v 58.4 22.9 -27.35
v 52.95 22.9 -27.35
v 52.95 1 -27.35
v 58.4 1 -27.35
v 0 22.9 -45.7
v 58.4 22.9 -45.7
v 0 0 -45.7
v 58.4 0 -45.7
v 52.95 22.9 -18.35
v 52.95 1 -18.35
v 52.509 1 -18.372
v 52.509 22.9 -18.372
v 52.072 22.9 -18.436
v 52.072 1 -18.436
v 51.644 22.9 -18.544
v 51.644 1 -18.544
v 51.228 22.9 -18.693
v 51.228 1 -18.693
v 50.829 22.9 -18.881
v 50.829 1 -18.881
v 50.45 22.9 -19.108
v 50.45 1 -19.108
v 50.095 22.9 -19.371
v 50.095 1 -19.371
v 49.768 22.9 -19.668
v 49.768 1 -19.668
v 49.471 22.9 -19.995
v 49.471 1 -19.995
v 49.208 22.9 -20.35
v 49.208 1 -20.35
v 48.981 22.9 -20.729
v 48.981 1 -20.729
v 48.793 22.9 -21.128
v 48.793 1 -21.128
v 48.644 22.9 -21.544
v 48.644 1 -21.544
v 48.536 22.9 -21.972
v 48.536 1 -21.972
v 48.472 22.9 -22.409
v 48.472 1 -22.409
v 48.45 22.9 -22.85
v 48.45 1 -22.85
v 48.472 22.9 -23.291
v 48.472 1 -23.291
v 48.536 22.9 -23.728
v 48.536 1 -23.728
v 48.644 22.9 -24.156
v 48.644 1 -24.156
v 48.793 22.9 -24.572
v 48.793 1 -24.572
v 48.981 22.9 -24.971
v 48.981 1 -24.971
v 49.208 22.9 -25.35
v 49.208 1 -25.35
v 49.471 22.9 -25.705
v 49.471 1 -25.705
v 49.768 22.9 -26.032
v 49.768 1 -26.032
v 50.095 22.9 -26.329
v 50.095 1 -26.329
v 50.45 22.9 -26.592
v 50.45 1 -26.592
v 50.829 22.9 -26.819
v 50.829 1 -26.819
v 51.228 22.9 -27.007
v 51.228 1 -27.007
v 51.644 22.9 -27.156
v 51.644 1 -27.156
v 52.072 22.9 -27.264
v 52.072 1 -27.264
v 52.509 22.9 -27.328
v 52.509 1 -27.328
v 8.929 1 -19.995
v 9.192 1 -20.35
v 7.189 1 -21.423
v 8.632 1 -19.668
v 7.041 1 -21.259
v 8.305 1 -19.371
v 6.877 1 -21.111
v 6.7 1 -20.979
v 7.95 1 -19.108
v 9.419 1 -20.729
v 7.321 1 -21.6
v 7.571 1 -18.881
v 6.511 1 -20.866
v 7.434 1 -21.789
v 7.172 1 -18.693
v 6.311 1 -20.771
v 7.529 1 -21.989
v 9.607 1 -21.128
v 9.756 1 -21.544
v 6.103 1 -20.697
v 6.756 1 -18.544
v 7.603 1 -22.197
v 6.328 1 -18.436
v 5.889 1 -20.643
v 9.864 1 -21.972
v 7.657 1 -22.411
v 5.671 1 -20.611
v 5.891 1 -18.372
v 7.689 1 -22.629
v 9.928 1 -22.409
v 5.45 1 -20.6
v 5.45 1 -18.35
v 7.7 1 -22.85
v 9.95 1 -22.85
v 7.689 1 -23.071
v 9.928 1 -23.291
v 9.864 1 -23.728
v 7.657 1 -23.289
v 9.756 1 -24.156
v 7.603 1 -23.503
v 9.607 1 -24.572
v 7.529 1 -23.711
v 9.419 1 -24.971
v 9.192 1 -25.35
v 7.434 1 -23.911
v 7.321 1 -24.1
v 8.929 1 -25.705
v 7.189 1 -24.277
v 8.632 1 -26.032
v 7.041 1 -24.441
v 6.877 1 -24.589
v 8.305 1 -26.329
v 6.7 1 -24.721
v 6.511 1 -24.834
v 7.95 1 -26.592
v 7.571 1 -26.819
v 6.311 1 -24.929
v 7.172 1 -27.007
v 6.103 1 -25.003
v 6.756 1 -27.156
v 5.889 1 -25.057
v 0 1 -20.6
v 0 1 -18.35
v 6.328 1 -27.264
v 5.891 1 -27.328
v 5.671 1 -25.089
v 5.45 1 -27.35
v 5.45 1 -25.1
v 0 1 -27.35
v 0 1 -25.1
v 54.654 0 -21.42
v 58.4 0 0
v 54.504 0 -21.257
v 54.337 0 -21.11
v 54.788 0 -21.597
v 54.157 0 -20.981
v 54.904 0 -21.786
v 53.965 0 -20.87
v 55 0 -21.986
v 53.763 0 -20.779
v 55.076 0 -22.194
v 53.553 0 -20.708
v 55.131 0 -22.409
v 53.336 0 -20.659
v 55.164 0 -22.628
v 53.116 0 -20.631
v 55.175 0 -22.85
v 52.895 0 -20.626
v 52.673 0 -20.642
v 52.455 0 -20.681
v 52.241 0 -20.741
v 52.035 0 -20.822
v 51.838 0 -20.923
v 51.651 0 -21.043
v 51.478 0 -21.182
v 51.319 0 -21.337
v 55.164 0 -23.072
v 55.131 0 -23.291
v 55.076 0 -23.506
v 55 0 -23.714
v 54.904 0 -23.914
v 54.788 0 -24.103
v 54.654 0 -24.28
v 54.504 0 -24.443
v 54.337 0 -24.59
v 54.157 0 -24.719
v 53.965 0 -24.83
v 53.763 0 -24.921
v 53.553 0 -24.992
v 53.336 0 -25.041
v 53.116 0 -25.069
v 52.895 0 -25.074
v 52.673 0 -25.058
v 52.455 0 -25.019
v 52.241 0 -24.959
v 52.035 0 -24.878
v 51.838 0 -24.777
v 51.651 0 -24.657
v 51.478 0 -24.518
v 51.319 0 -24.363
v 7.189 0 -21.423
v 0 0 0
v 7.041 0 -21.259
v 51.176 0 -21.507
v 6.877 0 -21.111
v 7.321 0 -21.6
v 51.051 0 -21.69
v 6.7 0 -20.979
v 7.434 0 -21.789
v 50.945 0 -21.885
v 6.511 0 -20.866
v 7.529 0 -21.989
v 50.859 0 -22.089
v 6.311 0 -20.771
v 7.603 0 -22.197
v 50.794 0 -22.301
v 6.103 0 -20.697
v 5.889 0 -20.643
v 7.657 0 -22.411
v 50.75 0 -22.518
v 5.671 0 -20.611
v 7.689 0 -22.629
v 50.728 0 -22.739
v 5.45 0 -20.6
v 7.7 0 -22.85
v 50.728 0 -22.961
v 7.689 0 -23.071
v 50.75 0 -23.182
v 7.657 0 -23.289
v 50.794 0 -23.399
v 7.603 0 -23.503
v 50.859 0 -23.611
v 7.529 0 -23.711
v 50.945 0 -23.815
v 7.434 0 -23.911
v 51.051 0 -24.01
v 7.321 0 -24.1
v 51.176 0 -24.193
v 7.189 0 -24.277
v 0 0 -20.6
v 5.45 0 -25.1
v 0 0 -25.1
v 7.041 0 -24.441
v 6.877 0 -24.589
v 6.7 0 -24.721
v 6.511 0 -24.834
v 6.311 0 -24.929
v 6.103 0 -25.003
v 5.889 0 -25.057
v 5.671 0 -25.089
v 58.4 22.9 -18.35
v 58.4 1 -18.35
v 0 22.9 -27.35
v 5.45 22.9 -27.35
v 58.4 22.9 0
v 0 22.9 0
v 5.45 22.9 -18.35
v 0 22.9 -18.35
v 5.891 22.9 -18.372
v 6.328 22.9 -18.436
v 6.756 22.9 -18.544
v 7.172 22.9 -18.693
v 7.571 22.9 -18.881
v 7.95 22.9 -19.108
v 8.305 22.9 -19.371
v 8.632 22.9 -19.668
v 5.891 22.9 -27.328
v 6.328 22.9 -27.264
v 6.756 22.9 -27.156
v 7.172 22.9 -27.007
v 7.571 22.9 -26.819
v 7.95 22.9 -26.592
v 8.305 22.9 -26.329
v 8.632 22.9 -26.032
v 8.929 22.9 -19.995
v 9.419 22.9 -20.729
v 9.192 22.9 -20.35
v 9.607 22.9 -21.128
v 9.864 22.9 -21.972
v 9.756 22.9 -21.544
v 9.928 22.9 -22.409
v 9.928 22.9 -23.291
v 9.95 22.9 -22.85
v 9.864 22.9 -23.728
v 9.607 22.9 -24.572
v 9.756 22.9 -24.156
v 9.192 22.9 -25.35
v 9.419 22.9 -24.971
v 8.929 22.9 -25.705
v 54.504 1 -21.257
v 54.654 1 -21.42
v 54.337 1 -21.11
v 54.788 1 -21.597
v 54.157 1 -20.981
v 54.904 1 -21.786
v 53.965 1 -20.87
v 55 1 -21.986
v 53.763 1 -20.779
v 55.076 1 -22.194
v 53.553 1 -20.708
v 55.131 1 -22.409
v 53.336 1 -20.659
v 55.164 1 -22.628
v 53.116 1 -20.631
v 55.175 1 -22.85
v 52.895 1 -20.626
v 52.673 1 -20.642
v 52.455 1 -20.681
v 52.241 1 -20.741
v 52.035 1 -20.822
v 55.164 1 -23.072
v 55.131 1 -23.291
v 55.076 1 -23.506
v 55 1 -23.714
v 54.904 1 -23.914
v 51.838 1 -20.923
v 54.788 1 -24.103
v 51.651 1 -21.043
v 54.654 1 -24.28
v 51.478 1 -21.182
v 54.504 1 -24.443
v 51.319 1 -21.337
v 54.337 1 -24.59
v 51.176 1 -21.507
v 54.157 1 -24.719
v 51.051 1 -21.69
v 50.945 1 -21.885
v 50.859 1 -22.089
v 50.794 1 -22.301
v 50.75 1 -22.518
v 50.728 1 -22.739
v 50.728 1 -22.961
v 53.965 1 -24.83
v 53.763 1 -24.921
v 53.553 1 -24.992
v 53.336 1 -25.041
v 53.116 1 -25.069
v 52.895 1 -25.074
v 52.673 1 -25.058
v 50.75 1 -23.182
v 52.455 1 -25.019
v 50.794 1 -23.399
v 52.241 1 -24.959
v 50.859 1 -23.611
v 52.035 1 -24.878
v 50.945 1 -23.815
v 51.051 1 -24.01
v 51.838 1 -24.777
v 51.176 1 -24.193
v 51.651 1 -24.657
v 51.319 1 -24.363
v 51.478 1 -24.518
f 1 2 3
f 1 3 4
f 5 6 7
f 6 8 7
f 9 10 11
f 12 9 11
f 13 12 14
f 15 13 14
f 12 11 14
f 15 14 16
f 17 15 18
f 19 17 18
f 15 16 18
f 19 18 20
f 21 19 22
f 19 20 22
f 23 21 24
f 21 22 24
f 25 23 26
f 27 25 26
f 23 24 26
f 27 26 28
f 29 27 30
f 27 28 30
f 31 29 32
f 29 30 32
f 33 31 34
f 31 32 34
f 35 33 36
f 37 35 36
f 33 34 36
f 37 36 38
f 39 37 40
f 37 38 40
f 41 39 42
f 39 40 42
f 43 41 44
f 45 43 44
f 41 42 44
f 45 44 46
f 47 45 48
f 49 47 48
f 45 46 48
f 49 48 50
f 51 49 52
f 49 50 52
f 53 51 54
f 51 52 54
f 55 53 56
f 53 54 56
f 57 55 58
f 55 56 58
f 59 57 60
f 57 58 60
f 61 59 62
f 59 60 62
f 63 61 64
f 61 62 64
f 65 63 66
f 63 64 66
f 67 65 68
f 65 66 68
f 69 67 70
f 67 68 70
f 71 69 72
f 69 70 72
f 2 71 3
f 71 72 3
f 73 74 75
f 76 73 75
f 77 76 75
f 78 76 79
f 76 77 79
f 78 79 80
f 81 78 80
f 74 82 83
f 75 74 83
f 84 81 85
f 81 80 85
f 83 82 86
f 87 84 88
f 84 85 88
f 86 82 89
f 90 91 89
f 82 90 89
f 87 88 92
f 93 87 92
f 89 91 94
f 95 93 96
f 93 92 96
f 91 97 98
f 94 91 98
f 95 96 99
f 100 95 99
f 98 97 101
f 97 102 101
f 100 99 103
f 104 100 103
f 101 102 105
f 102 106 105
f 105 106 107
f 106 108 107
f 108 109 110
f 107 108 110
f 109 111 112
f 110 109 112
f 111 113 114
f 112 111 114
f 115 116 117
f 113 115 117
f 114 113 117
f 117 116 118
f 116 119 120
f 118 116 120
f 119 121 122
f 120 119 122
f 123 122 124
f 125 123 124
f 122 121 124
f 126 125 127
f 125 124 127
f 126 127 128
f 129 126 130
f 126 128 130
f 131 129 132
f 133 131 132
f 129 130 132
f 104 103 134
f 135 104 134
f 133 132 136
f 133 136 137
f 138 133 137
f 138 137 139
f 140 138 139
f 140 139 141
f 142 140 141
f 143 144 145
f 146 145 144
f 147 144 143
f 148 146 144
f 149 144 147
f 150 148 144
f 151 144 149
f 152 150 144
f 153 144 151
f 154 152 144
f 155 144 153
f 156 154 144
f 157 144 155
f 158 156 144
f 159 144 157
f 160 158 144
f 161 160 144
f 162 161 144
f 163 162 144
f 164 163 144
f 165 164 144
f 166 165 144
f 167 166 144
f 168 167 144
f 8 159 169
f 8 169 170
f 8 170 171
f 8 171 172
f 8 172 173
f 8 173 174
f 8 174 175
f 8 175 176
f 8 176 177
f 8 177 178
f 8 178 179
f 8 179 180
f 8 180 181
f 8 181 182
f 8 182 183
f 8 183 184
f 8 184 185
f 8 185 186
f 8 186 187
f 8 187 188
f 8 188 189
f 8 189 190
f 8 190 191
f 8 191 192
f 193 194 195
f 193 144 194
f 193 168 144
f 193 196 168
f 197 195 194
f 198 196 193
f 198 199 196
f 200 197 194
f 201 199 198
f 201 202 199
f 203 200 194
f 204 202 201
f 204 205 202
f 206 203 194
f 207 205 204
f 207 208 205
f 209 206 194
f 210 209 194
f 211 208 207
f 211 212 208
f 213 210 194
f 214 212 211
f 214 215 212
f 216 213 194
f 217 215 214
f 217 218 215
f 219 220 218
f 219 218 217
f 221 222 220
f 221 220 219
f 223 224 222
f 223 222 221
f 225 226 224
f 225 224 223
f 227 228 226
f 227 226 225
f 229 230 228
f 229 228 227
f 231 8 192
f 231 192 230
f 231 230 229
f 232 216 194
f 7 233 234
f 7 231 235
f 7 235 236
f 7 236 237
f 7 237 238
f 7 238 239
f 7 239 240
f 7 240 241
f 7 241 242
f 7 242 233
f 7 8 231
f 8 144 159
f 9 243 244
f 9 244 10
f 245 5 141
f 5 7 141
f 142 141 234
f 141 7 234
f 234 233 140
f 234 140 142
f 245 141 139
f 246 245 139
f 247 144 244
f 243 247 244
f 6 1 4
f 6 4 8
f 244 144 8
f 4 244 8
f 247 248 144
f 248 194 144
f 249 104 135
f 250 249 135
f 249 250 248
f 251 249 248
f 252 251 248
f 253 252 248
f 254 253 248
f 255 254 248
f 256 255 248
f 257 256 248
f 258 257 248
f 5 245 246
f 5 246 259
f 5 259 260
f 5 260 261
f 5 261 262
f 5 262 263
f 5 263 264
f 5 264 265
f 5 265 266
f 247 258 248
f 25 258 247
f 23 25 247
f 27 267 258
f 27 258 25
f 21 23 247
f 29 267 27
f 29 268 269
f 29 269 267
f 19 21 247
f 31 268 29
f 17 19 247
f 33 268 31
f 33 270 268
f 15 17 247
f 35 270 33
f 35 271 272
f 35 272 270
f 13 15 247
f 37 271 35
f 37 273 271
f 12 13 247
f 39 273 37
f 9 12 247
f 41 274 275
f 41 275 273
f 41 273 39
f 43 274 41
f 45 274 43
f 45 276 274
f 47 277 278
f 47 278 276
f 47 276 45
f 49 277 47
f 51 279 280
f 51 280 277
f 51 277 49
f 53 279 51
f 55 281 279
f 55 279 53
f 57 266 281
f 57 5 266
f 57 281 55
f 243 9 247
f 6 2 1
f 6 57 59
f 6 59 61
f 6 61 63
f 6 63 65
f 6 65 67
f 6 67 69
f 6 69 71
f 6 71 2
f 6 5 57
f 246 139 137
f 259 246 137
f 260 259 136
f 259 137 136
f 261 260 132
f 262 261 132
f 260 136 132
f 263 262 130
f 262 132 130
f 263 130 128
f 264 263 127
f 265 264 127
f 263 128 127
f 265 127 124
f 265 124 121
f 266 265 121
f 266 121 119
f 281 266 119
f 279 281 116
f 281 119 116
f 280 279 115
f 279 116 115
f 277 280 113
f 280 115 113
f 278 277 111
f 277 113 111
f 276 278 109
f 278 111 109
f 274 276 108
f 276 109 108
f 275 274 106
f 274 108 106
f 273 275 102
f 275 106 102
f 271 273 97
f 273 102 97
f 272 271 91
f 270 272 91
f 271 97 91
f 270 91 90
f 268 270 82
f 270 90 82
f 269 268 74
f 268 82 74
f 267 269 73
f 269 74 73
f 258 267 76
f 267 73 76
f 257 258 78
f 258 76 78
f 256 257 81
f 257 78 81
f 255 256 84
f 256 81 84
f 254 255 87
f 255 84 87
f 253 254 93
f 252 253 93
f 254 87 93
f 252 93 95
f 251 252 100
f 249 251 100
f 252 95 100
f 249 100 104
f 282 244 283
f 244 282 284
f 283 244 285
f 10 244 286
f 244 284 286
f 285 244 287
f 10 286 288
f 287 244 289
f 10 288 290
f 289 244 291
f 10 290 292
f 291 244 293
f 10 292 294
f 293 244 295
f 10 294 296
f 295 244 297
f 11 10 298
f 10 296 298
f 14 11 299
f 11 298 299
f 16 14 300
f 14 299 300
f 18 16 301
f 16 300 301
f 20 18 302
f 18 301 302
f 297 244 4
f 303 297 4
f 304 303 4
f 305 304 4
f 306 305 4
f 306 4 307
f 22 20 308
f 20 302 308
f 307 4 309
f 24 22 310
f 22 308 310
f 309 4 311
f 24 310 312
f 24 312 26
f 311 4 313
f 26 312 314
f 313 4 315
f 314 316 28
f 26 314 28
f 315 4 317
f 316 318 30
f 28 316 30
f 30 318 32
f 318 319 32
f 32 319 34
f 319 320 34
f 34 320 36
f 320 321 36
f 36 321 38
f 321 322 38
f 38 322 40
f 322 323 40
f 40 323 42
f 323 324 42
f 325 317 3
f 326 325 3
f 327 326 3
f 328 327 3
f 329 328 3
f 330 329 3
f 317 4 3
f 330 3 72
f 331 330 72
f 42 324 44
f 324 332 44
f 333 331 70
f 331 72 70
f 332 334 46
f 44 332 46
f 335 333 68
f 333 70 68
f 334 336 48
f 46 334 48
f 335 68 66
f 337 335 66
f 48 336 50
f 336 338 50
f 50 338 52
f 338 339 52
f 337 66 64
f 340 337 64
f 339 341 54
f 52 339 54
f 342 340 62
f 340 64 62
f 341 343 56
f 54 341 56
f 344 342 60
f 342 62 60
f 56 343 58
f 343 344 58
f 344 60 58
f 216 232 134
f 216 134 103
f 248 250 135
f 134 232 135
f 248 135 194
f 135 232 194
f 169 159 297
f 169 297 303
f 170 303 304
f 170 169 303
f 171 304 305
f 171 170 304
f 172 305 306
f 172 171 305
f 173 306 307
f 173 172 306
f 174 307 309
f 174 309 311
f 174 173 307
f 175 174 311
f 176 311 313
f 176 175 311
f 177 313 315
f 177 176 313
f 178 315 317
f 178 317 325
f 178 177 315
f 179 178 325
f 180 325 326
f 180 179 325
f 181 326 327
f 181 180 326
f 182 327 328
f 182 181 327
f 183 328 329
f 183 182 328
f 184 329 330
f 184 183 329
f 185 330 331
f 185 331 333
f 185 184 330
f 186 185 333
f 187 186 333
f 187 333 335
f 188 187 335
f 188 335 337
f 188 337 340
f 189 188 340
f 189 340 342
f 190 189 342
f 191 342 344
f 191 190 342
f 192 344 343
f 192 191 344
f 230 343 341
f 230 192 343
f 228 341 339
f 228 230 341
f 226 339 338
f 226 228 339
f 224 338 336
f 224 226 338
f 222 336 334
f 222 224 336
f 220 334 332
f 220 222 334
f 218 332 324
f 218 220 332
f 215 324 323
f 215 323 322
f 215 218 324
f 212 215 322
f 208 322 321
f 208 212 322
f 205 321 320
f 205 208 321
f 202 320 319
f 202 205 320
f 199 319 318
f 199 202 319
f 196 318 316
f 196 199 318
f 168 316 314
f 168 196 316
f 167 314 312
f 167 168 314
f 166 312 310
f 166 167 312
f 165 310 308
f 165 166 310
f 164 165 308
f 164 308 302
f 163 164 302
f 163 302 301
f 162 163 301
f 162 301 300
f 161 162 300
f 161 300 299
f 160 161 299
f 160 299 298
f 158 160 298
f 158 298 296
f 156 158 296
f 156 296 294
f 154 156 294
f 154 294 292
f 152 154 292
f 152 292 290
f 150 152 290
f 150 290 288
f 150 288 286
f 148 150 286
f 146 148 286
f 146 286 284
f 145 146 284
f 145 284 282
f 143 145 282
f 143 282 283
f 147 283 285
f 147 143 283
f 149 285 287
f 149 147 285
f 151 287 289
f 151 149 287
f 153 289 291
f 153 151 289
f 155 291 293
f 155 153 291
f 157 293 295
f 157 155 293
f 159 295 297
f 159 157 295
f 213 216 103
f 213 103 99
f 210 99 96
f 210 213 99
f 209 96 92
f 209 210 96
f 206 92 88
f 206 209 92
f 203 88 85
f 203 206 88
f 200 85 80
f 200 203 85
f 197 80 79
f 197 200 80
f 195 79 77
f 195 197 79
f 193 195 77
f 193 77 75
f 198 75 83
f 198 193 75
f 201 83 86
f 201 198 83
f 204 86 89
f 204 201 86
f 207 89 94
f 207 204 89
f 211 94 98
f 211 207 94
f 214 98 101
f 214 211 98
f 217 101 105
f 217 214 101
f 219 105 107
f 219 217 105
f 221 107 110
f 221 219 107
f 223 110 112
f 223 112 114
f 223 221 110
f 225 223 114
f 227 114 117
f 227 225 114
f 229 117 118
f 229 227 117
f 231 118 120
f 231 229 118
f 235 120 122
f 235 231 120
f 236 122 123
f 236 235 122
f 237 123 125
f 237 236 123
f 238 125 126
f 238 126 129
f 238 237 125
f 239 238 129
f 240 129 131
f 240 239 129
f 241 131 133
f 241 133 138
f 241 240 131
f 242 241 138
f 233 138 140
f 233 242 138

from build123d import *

# Parameters (mm, degrees)
SKETCH1_R           = 2.225
BASEPLATE_DEPTH     = 1
BOSS_EXTRUDE4_DEPTH = 21.9


with BuildPart() as part:
    # Sketch1 → BasePlate (new body)
    with BuildSketch(Plane(origin=(0, 0, 0), x_dir=(1, 0, 0), z_dir=(0, 1, 0))):
        with BuildLine():
            Line((5.45, 25.1), (0, 25.1))
            Line((0, 25.1), (0, 45.7))
            Line((0, 45.7), (58.4, 45.7))
            Line((58.4, 45.7), (58.4, 0))
            Line((58.4, 0), (0, 0))
            Line((0, 0), (0, 20.6))
            Line((0, 20.6), (5.45, 20.6))
            ThreePointArc((5.45, 20.6), (7.7, 22.85), (5.45, 25.1))
        make_face()
        with Locations((52.95, 22.85)):
            Circle(SKETCH1_R, mode=Mode.SUBTRACT)
    extrude(amount=BASEPLATE_DEPTH)

    # Sketch2 → Boss-Extrude4 (add)
    with BuildSketch(Plane(origin=(0, 1, 0), x_dir=(1, 0, 0), z_dir=(0, 1, 0))):
        with BuildLine():
            Line((52.95, 27.35), (58.4, 27.35))
            Line((58.4, 27.35), (58.4, 45.7))
            Line((58.4, 45.7), (0, 45.7))
            Line((0, 45.7), (0, 27.35))
            Line((0, 27.35), (5.45, 27.35))
            ThreePointArc((5.45, 27.35), (9.95, 22.85), (5.45, 18.35))
            Line((5.45, 18.35), (0, 18.35))
            Line((0, 18.35), (0, 0))
            Line((0, 0), (58.4, 0))
            Line((58.4, 0), (58.4, 18.35))
            Line((58.4, 18.35), (52.95, 18.35))
            ThreePointArc((52.95, 18.35), (48.45, 22.85), (52.95, 27.35))
        make_face()
    extrude(amount=BOSS_EXTRUDE4_DEPTH)


solid = part.part
